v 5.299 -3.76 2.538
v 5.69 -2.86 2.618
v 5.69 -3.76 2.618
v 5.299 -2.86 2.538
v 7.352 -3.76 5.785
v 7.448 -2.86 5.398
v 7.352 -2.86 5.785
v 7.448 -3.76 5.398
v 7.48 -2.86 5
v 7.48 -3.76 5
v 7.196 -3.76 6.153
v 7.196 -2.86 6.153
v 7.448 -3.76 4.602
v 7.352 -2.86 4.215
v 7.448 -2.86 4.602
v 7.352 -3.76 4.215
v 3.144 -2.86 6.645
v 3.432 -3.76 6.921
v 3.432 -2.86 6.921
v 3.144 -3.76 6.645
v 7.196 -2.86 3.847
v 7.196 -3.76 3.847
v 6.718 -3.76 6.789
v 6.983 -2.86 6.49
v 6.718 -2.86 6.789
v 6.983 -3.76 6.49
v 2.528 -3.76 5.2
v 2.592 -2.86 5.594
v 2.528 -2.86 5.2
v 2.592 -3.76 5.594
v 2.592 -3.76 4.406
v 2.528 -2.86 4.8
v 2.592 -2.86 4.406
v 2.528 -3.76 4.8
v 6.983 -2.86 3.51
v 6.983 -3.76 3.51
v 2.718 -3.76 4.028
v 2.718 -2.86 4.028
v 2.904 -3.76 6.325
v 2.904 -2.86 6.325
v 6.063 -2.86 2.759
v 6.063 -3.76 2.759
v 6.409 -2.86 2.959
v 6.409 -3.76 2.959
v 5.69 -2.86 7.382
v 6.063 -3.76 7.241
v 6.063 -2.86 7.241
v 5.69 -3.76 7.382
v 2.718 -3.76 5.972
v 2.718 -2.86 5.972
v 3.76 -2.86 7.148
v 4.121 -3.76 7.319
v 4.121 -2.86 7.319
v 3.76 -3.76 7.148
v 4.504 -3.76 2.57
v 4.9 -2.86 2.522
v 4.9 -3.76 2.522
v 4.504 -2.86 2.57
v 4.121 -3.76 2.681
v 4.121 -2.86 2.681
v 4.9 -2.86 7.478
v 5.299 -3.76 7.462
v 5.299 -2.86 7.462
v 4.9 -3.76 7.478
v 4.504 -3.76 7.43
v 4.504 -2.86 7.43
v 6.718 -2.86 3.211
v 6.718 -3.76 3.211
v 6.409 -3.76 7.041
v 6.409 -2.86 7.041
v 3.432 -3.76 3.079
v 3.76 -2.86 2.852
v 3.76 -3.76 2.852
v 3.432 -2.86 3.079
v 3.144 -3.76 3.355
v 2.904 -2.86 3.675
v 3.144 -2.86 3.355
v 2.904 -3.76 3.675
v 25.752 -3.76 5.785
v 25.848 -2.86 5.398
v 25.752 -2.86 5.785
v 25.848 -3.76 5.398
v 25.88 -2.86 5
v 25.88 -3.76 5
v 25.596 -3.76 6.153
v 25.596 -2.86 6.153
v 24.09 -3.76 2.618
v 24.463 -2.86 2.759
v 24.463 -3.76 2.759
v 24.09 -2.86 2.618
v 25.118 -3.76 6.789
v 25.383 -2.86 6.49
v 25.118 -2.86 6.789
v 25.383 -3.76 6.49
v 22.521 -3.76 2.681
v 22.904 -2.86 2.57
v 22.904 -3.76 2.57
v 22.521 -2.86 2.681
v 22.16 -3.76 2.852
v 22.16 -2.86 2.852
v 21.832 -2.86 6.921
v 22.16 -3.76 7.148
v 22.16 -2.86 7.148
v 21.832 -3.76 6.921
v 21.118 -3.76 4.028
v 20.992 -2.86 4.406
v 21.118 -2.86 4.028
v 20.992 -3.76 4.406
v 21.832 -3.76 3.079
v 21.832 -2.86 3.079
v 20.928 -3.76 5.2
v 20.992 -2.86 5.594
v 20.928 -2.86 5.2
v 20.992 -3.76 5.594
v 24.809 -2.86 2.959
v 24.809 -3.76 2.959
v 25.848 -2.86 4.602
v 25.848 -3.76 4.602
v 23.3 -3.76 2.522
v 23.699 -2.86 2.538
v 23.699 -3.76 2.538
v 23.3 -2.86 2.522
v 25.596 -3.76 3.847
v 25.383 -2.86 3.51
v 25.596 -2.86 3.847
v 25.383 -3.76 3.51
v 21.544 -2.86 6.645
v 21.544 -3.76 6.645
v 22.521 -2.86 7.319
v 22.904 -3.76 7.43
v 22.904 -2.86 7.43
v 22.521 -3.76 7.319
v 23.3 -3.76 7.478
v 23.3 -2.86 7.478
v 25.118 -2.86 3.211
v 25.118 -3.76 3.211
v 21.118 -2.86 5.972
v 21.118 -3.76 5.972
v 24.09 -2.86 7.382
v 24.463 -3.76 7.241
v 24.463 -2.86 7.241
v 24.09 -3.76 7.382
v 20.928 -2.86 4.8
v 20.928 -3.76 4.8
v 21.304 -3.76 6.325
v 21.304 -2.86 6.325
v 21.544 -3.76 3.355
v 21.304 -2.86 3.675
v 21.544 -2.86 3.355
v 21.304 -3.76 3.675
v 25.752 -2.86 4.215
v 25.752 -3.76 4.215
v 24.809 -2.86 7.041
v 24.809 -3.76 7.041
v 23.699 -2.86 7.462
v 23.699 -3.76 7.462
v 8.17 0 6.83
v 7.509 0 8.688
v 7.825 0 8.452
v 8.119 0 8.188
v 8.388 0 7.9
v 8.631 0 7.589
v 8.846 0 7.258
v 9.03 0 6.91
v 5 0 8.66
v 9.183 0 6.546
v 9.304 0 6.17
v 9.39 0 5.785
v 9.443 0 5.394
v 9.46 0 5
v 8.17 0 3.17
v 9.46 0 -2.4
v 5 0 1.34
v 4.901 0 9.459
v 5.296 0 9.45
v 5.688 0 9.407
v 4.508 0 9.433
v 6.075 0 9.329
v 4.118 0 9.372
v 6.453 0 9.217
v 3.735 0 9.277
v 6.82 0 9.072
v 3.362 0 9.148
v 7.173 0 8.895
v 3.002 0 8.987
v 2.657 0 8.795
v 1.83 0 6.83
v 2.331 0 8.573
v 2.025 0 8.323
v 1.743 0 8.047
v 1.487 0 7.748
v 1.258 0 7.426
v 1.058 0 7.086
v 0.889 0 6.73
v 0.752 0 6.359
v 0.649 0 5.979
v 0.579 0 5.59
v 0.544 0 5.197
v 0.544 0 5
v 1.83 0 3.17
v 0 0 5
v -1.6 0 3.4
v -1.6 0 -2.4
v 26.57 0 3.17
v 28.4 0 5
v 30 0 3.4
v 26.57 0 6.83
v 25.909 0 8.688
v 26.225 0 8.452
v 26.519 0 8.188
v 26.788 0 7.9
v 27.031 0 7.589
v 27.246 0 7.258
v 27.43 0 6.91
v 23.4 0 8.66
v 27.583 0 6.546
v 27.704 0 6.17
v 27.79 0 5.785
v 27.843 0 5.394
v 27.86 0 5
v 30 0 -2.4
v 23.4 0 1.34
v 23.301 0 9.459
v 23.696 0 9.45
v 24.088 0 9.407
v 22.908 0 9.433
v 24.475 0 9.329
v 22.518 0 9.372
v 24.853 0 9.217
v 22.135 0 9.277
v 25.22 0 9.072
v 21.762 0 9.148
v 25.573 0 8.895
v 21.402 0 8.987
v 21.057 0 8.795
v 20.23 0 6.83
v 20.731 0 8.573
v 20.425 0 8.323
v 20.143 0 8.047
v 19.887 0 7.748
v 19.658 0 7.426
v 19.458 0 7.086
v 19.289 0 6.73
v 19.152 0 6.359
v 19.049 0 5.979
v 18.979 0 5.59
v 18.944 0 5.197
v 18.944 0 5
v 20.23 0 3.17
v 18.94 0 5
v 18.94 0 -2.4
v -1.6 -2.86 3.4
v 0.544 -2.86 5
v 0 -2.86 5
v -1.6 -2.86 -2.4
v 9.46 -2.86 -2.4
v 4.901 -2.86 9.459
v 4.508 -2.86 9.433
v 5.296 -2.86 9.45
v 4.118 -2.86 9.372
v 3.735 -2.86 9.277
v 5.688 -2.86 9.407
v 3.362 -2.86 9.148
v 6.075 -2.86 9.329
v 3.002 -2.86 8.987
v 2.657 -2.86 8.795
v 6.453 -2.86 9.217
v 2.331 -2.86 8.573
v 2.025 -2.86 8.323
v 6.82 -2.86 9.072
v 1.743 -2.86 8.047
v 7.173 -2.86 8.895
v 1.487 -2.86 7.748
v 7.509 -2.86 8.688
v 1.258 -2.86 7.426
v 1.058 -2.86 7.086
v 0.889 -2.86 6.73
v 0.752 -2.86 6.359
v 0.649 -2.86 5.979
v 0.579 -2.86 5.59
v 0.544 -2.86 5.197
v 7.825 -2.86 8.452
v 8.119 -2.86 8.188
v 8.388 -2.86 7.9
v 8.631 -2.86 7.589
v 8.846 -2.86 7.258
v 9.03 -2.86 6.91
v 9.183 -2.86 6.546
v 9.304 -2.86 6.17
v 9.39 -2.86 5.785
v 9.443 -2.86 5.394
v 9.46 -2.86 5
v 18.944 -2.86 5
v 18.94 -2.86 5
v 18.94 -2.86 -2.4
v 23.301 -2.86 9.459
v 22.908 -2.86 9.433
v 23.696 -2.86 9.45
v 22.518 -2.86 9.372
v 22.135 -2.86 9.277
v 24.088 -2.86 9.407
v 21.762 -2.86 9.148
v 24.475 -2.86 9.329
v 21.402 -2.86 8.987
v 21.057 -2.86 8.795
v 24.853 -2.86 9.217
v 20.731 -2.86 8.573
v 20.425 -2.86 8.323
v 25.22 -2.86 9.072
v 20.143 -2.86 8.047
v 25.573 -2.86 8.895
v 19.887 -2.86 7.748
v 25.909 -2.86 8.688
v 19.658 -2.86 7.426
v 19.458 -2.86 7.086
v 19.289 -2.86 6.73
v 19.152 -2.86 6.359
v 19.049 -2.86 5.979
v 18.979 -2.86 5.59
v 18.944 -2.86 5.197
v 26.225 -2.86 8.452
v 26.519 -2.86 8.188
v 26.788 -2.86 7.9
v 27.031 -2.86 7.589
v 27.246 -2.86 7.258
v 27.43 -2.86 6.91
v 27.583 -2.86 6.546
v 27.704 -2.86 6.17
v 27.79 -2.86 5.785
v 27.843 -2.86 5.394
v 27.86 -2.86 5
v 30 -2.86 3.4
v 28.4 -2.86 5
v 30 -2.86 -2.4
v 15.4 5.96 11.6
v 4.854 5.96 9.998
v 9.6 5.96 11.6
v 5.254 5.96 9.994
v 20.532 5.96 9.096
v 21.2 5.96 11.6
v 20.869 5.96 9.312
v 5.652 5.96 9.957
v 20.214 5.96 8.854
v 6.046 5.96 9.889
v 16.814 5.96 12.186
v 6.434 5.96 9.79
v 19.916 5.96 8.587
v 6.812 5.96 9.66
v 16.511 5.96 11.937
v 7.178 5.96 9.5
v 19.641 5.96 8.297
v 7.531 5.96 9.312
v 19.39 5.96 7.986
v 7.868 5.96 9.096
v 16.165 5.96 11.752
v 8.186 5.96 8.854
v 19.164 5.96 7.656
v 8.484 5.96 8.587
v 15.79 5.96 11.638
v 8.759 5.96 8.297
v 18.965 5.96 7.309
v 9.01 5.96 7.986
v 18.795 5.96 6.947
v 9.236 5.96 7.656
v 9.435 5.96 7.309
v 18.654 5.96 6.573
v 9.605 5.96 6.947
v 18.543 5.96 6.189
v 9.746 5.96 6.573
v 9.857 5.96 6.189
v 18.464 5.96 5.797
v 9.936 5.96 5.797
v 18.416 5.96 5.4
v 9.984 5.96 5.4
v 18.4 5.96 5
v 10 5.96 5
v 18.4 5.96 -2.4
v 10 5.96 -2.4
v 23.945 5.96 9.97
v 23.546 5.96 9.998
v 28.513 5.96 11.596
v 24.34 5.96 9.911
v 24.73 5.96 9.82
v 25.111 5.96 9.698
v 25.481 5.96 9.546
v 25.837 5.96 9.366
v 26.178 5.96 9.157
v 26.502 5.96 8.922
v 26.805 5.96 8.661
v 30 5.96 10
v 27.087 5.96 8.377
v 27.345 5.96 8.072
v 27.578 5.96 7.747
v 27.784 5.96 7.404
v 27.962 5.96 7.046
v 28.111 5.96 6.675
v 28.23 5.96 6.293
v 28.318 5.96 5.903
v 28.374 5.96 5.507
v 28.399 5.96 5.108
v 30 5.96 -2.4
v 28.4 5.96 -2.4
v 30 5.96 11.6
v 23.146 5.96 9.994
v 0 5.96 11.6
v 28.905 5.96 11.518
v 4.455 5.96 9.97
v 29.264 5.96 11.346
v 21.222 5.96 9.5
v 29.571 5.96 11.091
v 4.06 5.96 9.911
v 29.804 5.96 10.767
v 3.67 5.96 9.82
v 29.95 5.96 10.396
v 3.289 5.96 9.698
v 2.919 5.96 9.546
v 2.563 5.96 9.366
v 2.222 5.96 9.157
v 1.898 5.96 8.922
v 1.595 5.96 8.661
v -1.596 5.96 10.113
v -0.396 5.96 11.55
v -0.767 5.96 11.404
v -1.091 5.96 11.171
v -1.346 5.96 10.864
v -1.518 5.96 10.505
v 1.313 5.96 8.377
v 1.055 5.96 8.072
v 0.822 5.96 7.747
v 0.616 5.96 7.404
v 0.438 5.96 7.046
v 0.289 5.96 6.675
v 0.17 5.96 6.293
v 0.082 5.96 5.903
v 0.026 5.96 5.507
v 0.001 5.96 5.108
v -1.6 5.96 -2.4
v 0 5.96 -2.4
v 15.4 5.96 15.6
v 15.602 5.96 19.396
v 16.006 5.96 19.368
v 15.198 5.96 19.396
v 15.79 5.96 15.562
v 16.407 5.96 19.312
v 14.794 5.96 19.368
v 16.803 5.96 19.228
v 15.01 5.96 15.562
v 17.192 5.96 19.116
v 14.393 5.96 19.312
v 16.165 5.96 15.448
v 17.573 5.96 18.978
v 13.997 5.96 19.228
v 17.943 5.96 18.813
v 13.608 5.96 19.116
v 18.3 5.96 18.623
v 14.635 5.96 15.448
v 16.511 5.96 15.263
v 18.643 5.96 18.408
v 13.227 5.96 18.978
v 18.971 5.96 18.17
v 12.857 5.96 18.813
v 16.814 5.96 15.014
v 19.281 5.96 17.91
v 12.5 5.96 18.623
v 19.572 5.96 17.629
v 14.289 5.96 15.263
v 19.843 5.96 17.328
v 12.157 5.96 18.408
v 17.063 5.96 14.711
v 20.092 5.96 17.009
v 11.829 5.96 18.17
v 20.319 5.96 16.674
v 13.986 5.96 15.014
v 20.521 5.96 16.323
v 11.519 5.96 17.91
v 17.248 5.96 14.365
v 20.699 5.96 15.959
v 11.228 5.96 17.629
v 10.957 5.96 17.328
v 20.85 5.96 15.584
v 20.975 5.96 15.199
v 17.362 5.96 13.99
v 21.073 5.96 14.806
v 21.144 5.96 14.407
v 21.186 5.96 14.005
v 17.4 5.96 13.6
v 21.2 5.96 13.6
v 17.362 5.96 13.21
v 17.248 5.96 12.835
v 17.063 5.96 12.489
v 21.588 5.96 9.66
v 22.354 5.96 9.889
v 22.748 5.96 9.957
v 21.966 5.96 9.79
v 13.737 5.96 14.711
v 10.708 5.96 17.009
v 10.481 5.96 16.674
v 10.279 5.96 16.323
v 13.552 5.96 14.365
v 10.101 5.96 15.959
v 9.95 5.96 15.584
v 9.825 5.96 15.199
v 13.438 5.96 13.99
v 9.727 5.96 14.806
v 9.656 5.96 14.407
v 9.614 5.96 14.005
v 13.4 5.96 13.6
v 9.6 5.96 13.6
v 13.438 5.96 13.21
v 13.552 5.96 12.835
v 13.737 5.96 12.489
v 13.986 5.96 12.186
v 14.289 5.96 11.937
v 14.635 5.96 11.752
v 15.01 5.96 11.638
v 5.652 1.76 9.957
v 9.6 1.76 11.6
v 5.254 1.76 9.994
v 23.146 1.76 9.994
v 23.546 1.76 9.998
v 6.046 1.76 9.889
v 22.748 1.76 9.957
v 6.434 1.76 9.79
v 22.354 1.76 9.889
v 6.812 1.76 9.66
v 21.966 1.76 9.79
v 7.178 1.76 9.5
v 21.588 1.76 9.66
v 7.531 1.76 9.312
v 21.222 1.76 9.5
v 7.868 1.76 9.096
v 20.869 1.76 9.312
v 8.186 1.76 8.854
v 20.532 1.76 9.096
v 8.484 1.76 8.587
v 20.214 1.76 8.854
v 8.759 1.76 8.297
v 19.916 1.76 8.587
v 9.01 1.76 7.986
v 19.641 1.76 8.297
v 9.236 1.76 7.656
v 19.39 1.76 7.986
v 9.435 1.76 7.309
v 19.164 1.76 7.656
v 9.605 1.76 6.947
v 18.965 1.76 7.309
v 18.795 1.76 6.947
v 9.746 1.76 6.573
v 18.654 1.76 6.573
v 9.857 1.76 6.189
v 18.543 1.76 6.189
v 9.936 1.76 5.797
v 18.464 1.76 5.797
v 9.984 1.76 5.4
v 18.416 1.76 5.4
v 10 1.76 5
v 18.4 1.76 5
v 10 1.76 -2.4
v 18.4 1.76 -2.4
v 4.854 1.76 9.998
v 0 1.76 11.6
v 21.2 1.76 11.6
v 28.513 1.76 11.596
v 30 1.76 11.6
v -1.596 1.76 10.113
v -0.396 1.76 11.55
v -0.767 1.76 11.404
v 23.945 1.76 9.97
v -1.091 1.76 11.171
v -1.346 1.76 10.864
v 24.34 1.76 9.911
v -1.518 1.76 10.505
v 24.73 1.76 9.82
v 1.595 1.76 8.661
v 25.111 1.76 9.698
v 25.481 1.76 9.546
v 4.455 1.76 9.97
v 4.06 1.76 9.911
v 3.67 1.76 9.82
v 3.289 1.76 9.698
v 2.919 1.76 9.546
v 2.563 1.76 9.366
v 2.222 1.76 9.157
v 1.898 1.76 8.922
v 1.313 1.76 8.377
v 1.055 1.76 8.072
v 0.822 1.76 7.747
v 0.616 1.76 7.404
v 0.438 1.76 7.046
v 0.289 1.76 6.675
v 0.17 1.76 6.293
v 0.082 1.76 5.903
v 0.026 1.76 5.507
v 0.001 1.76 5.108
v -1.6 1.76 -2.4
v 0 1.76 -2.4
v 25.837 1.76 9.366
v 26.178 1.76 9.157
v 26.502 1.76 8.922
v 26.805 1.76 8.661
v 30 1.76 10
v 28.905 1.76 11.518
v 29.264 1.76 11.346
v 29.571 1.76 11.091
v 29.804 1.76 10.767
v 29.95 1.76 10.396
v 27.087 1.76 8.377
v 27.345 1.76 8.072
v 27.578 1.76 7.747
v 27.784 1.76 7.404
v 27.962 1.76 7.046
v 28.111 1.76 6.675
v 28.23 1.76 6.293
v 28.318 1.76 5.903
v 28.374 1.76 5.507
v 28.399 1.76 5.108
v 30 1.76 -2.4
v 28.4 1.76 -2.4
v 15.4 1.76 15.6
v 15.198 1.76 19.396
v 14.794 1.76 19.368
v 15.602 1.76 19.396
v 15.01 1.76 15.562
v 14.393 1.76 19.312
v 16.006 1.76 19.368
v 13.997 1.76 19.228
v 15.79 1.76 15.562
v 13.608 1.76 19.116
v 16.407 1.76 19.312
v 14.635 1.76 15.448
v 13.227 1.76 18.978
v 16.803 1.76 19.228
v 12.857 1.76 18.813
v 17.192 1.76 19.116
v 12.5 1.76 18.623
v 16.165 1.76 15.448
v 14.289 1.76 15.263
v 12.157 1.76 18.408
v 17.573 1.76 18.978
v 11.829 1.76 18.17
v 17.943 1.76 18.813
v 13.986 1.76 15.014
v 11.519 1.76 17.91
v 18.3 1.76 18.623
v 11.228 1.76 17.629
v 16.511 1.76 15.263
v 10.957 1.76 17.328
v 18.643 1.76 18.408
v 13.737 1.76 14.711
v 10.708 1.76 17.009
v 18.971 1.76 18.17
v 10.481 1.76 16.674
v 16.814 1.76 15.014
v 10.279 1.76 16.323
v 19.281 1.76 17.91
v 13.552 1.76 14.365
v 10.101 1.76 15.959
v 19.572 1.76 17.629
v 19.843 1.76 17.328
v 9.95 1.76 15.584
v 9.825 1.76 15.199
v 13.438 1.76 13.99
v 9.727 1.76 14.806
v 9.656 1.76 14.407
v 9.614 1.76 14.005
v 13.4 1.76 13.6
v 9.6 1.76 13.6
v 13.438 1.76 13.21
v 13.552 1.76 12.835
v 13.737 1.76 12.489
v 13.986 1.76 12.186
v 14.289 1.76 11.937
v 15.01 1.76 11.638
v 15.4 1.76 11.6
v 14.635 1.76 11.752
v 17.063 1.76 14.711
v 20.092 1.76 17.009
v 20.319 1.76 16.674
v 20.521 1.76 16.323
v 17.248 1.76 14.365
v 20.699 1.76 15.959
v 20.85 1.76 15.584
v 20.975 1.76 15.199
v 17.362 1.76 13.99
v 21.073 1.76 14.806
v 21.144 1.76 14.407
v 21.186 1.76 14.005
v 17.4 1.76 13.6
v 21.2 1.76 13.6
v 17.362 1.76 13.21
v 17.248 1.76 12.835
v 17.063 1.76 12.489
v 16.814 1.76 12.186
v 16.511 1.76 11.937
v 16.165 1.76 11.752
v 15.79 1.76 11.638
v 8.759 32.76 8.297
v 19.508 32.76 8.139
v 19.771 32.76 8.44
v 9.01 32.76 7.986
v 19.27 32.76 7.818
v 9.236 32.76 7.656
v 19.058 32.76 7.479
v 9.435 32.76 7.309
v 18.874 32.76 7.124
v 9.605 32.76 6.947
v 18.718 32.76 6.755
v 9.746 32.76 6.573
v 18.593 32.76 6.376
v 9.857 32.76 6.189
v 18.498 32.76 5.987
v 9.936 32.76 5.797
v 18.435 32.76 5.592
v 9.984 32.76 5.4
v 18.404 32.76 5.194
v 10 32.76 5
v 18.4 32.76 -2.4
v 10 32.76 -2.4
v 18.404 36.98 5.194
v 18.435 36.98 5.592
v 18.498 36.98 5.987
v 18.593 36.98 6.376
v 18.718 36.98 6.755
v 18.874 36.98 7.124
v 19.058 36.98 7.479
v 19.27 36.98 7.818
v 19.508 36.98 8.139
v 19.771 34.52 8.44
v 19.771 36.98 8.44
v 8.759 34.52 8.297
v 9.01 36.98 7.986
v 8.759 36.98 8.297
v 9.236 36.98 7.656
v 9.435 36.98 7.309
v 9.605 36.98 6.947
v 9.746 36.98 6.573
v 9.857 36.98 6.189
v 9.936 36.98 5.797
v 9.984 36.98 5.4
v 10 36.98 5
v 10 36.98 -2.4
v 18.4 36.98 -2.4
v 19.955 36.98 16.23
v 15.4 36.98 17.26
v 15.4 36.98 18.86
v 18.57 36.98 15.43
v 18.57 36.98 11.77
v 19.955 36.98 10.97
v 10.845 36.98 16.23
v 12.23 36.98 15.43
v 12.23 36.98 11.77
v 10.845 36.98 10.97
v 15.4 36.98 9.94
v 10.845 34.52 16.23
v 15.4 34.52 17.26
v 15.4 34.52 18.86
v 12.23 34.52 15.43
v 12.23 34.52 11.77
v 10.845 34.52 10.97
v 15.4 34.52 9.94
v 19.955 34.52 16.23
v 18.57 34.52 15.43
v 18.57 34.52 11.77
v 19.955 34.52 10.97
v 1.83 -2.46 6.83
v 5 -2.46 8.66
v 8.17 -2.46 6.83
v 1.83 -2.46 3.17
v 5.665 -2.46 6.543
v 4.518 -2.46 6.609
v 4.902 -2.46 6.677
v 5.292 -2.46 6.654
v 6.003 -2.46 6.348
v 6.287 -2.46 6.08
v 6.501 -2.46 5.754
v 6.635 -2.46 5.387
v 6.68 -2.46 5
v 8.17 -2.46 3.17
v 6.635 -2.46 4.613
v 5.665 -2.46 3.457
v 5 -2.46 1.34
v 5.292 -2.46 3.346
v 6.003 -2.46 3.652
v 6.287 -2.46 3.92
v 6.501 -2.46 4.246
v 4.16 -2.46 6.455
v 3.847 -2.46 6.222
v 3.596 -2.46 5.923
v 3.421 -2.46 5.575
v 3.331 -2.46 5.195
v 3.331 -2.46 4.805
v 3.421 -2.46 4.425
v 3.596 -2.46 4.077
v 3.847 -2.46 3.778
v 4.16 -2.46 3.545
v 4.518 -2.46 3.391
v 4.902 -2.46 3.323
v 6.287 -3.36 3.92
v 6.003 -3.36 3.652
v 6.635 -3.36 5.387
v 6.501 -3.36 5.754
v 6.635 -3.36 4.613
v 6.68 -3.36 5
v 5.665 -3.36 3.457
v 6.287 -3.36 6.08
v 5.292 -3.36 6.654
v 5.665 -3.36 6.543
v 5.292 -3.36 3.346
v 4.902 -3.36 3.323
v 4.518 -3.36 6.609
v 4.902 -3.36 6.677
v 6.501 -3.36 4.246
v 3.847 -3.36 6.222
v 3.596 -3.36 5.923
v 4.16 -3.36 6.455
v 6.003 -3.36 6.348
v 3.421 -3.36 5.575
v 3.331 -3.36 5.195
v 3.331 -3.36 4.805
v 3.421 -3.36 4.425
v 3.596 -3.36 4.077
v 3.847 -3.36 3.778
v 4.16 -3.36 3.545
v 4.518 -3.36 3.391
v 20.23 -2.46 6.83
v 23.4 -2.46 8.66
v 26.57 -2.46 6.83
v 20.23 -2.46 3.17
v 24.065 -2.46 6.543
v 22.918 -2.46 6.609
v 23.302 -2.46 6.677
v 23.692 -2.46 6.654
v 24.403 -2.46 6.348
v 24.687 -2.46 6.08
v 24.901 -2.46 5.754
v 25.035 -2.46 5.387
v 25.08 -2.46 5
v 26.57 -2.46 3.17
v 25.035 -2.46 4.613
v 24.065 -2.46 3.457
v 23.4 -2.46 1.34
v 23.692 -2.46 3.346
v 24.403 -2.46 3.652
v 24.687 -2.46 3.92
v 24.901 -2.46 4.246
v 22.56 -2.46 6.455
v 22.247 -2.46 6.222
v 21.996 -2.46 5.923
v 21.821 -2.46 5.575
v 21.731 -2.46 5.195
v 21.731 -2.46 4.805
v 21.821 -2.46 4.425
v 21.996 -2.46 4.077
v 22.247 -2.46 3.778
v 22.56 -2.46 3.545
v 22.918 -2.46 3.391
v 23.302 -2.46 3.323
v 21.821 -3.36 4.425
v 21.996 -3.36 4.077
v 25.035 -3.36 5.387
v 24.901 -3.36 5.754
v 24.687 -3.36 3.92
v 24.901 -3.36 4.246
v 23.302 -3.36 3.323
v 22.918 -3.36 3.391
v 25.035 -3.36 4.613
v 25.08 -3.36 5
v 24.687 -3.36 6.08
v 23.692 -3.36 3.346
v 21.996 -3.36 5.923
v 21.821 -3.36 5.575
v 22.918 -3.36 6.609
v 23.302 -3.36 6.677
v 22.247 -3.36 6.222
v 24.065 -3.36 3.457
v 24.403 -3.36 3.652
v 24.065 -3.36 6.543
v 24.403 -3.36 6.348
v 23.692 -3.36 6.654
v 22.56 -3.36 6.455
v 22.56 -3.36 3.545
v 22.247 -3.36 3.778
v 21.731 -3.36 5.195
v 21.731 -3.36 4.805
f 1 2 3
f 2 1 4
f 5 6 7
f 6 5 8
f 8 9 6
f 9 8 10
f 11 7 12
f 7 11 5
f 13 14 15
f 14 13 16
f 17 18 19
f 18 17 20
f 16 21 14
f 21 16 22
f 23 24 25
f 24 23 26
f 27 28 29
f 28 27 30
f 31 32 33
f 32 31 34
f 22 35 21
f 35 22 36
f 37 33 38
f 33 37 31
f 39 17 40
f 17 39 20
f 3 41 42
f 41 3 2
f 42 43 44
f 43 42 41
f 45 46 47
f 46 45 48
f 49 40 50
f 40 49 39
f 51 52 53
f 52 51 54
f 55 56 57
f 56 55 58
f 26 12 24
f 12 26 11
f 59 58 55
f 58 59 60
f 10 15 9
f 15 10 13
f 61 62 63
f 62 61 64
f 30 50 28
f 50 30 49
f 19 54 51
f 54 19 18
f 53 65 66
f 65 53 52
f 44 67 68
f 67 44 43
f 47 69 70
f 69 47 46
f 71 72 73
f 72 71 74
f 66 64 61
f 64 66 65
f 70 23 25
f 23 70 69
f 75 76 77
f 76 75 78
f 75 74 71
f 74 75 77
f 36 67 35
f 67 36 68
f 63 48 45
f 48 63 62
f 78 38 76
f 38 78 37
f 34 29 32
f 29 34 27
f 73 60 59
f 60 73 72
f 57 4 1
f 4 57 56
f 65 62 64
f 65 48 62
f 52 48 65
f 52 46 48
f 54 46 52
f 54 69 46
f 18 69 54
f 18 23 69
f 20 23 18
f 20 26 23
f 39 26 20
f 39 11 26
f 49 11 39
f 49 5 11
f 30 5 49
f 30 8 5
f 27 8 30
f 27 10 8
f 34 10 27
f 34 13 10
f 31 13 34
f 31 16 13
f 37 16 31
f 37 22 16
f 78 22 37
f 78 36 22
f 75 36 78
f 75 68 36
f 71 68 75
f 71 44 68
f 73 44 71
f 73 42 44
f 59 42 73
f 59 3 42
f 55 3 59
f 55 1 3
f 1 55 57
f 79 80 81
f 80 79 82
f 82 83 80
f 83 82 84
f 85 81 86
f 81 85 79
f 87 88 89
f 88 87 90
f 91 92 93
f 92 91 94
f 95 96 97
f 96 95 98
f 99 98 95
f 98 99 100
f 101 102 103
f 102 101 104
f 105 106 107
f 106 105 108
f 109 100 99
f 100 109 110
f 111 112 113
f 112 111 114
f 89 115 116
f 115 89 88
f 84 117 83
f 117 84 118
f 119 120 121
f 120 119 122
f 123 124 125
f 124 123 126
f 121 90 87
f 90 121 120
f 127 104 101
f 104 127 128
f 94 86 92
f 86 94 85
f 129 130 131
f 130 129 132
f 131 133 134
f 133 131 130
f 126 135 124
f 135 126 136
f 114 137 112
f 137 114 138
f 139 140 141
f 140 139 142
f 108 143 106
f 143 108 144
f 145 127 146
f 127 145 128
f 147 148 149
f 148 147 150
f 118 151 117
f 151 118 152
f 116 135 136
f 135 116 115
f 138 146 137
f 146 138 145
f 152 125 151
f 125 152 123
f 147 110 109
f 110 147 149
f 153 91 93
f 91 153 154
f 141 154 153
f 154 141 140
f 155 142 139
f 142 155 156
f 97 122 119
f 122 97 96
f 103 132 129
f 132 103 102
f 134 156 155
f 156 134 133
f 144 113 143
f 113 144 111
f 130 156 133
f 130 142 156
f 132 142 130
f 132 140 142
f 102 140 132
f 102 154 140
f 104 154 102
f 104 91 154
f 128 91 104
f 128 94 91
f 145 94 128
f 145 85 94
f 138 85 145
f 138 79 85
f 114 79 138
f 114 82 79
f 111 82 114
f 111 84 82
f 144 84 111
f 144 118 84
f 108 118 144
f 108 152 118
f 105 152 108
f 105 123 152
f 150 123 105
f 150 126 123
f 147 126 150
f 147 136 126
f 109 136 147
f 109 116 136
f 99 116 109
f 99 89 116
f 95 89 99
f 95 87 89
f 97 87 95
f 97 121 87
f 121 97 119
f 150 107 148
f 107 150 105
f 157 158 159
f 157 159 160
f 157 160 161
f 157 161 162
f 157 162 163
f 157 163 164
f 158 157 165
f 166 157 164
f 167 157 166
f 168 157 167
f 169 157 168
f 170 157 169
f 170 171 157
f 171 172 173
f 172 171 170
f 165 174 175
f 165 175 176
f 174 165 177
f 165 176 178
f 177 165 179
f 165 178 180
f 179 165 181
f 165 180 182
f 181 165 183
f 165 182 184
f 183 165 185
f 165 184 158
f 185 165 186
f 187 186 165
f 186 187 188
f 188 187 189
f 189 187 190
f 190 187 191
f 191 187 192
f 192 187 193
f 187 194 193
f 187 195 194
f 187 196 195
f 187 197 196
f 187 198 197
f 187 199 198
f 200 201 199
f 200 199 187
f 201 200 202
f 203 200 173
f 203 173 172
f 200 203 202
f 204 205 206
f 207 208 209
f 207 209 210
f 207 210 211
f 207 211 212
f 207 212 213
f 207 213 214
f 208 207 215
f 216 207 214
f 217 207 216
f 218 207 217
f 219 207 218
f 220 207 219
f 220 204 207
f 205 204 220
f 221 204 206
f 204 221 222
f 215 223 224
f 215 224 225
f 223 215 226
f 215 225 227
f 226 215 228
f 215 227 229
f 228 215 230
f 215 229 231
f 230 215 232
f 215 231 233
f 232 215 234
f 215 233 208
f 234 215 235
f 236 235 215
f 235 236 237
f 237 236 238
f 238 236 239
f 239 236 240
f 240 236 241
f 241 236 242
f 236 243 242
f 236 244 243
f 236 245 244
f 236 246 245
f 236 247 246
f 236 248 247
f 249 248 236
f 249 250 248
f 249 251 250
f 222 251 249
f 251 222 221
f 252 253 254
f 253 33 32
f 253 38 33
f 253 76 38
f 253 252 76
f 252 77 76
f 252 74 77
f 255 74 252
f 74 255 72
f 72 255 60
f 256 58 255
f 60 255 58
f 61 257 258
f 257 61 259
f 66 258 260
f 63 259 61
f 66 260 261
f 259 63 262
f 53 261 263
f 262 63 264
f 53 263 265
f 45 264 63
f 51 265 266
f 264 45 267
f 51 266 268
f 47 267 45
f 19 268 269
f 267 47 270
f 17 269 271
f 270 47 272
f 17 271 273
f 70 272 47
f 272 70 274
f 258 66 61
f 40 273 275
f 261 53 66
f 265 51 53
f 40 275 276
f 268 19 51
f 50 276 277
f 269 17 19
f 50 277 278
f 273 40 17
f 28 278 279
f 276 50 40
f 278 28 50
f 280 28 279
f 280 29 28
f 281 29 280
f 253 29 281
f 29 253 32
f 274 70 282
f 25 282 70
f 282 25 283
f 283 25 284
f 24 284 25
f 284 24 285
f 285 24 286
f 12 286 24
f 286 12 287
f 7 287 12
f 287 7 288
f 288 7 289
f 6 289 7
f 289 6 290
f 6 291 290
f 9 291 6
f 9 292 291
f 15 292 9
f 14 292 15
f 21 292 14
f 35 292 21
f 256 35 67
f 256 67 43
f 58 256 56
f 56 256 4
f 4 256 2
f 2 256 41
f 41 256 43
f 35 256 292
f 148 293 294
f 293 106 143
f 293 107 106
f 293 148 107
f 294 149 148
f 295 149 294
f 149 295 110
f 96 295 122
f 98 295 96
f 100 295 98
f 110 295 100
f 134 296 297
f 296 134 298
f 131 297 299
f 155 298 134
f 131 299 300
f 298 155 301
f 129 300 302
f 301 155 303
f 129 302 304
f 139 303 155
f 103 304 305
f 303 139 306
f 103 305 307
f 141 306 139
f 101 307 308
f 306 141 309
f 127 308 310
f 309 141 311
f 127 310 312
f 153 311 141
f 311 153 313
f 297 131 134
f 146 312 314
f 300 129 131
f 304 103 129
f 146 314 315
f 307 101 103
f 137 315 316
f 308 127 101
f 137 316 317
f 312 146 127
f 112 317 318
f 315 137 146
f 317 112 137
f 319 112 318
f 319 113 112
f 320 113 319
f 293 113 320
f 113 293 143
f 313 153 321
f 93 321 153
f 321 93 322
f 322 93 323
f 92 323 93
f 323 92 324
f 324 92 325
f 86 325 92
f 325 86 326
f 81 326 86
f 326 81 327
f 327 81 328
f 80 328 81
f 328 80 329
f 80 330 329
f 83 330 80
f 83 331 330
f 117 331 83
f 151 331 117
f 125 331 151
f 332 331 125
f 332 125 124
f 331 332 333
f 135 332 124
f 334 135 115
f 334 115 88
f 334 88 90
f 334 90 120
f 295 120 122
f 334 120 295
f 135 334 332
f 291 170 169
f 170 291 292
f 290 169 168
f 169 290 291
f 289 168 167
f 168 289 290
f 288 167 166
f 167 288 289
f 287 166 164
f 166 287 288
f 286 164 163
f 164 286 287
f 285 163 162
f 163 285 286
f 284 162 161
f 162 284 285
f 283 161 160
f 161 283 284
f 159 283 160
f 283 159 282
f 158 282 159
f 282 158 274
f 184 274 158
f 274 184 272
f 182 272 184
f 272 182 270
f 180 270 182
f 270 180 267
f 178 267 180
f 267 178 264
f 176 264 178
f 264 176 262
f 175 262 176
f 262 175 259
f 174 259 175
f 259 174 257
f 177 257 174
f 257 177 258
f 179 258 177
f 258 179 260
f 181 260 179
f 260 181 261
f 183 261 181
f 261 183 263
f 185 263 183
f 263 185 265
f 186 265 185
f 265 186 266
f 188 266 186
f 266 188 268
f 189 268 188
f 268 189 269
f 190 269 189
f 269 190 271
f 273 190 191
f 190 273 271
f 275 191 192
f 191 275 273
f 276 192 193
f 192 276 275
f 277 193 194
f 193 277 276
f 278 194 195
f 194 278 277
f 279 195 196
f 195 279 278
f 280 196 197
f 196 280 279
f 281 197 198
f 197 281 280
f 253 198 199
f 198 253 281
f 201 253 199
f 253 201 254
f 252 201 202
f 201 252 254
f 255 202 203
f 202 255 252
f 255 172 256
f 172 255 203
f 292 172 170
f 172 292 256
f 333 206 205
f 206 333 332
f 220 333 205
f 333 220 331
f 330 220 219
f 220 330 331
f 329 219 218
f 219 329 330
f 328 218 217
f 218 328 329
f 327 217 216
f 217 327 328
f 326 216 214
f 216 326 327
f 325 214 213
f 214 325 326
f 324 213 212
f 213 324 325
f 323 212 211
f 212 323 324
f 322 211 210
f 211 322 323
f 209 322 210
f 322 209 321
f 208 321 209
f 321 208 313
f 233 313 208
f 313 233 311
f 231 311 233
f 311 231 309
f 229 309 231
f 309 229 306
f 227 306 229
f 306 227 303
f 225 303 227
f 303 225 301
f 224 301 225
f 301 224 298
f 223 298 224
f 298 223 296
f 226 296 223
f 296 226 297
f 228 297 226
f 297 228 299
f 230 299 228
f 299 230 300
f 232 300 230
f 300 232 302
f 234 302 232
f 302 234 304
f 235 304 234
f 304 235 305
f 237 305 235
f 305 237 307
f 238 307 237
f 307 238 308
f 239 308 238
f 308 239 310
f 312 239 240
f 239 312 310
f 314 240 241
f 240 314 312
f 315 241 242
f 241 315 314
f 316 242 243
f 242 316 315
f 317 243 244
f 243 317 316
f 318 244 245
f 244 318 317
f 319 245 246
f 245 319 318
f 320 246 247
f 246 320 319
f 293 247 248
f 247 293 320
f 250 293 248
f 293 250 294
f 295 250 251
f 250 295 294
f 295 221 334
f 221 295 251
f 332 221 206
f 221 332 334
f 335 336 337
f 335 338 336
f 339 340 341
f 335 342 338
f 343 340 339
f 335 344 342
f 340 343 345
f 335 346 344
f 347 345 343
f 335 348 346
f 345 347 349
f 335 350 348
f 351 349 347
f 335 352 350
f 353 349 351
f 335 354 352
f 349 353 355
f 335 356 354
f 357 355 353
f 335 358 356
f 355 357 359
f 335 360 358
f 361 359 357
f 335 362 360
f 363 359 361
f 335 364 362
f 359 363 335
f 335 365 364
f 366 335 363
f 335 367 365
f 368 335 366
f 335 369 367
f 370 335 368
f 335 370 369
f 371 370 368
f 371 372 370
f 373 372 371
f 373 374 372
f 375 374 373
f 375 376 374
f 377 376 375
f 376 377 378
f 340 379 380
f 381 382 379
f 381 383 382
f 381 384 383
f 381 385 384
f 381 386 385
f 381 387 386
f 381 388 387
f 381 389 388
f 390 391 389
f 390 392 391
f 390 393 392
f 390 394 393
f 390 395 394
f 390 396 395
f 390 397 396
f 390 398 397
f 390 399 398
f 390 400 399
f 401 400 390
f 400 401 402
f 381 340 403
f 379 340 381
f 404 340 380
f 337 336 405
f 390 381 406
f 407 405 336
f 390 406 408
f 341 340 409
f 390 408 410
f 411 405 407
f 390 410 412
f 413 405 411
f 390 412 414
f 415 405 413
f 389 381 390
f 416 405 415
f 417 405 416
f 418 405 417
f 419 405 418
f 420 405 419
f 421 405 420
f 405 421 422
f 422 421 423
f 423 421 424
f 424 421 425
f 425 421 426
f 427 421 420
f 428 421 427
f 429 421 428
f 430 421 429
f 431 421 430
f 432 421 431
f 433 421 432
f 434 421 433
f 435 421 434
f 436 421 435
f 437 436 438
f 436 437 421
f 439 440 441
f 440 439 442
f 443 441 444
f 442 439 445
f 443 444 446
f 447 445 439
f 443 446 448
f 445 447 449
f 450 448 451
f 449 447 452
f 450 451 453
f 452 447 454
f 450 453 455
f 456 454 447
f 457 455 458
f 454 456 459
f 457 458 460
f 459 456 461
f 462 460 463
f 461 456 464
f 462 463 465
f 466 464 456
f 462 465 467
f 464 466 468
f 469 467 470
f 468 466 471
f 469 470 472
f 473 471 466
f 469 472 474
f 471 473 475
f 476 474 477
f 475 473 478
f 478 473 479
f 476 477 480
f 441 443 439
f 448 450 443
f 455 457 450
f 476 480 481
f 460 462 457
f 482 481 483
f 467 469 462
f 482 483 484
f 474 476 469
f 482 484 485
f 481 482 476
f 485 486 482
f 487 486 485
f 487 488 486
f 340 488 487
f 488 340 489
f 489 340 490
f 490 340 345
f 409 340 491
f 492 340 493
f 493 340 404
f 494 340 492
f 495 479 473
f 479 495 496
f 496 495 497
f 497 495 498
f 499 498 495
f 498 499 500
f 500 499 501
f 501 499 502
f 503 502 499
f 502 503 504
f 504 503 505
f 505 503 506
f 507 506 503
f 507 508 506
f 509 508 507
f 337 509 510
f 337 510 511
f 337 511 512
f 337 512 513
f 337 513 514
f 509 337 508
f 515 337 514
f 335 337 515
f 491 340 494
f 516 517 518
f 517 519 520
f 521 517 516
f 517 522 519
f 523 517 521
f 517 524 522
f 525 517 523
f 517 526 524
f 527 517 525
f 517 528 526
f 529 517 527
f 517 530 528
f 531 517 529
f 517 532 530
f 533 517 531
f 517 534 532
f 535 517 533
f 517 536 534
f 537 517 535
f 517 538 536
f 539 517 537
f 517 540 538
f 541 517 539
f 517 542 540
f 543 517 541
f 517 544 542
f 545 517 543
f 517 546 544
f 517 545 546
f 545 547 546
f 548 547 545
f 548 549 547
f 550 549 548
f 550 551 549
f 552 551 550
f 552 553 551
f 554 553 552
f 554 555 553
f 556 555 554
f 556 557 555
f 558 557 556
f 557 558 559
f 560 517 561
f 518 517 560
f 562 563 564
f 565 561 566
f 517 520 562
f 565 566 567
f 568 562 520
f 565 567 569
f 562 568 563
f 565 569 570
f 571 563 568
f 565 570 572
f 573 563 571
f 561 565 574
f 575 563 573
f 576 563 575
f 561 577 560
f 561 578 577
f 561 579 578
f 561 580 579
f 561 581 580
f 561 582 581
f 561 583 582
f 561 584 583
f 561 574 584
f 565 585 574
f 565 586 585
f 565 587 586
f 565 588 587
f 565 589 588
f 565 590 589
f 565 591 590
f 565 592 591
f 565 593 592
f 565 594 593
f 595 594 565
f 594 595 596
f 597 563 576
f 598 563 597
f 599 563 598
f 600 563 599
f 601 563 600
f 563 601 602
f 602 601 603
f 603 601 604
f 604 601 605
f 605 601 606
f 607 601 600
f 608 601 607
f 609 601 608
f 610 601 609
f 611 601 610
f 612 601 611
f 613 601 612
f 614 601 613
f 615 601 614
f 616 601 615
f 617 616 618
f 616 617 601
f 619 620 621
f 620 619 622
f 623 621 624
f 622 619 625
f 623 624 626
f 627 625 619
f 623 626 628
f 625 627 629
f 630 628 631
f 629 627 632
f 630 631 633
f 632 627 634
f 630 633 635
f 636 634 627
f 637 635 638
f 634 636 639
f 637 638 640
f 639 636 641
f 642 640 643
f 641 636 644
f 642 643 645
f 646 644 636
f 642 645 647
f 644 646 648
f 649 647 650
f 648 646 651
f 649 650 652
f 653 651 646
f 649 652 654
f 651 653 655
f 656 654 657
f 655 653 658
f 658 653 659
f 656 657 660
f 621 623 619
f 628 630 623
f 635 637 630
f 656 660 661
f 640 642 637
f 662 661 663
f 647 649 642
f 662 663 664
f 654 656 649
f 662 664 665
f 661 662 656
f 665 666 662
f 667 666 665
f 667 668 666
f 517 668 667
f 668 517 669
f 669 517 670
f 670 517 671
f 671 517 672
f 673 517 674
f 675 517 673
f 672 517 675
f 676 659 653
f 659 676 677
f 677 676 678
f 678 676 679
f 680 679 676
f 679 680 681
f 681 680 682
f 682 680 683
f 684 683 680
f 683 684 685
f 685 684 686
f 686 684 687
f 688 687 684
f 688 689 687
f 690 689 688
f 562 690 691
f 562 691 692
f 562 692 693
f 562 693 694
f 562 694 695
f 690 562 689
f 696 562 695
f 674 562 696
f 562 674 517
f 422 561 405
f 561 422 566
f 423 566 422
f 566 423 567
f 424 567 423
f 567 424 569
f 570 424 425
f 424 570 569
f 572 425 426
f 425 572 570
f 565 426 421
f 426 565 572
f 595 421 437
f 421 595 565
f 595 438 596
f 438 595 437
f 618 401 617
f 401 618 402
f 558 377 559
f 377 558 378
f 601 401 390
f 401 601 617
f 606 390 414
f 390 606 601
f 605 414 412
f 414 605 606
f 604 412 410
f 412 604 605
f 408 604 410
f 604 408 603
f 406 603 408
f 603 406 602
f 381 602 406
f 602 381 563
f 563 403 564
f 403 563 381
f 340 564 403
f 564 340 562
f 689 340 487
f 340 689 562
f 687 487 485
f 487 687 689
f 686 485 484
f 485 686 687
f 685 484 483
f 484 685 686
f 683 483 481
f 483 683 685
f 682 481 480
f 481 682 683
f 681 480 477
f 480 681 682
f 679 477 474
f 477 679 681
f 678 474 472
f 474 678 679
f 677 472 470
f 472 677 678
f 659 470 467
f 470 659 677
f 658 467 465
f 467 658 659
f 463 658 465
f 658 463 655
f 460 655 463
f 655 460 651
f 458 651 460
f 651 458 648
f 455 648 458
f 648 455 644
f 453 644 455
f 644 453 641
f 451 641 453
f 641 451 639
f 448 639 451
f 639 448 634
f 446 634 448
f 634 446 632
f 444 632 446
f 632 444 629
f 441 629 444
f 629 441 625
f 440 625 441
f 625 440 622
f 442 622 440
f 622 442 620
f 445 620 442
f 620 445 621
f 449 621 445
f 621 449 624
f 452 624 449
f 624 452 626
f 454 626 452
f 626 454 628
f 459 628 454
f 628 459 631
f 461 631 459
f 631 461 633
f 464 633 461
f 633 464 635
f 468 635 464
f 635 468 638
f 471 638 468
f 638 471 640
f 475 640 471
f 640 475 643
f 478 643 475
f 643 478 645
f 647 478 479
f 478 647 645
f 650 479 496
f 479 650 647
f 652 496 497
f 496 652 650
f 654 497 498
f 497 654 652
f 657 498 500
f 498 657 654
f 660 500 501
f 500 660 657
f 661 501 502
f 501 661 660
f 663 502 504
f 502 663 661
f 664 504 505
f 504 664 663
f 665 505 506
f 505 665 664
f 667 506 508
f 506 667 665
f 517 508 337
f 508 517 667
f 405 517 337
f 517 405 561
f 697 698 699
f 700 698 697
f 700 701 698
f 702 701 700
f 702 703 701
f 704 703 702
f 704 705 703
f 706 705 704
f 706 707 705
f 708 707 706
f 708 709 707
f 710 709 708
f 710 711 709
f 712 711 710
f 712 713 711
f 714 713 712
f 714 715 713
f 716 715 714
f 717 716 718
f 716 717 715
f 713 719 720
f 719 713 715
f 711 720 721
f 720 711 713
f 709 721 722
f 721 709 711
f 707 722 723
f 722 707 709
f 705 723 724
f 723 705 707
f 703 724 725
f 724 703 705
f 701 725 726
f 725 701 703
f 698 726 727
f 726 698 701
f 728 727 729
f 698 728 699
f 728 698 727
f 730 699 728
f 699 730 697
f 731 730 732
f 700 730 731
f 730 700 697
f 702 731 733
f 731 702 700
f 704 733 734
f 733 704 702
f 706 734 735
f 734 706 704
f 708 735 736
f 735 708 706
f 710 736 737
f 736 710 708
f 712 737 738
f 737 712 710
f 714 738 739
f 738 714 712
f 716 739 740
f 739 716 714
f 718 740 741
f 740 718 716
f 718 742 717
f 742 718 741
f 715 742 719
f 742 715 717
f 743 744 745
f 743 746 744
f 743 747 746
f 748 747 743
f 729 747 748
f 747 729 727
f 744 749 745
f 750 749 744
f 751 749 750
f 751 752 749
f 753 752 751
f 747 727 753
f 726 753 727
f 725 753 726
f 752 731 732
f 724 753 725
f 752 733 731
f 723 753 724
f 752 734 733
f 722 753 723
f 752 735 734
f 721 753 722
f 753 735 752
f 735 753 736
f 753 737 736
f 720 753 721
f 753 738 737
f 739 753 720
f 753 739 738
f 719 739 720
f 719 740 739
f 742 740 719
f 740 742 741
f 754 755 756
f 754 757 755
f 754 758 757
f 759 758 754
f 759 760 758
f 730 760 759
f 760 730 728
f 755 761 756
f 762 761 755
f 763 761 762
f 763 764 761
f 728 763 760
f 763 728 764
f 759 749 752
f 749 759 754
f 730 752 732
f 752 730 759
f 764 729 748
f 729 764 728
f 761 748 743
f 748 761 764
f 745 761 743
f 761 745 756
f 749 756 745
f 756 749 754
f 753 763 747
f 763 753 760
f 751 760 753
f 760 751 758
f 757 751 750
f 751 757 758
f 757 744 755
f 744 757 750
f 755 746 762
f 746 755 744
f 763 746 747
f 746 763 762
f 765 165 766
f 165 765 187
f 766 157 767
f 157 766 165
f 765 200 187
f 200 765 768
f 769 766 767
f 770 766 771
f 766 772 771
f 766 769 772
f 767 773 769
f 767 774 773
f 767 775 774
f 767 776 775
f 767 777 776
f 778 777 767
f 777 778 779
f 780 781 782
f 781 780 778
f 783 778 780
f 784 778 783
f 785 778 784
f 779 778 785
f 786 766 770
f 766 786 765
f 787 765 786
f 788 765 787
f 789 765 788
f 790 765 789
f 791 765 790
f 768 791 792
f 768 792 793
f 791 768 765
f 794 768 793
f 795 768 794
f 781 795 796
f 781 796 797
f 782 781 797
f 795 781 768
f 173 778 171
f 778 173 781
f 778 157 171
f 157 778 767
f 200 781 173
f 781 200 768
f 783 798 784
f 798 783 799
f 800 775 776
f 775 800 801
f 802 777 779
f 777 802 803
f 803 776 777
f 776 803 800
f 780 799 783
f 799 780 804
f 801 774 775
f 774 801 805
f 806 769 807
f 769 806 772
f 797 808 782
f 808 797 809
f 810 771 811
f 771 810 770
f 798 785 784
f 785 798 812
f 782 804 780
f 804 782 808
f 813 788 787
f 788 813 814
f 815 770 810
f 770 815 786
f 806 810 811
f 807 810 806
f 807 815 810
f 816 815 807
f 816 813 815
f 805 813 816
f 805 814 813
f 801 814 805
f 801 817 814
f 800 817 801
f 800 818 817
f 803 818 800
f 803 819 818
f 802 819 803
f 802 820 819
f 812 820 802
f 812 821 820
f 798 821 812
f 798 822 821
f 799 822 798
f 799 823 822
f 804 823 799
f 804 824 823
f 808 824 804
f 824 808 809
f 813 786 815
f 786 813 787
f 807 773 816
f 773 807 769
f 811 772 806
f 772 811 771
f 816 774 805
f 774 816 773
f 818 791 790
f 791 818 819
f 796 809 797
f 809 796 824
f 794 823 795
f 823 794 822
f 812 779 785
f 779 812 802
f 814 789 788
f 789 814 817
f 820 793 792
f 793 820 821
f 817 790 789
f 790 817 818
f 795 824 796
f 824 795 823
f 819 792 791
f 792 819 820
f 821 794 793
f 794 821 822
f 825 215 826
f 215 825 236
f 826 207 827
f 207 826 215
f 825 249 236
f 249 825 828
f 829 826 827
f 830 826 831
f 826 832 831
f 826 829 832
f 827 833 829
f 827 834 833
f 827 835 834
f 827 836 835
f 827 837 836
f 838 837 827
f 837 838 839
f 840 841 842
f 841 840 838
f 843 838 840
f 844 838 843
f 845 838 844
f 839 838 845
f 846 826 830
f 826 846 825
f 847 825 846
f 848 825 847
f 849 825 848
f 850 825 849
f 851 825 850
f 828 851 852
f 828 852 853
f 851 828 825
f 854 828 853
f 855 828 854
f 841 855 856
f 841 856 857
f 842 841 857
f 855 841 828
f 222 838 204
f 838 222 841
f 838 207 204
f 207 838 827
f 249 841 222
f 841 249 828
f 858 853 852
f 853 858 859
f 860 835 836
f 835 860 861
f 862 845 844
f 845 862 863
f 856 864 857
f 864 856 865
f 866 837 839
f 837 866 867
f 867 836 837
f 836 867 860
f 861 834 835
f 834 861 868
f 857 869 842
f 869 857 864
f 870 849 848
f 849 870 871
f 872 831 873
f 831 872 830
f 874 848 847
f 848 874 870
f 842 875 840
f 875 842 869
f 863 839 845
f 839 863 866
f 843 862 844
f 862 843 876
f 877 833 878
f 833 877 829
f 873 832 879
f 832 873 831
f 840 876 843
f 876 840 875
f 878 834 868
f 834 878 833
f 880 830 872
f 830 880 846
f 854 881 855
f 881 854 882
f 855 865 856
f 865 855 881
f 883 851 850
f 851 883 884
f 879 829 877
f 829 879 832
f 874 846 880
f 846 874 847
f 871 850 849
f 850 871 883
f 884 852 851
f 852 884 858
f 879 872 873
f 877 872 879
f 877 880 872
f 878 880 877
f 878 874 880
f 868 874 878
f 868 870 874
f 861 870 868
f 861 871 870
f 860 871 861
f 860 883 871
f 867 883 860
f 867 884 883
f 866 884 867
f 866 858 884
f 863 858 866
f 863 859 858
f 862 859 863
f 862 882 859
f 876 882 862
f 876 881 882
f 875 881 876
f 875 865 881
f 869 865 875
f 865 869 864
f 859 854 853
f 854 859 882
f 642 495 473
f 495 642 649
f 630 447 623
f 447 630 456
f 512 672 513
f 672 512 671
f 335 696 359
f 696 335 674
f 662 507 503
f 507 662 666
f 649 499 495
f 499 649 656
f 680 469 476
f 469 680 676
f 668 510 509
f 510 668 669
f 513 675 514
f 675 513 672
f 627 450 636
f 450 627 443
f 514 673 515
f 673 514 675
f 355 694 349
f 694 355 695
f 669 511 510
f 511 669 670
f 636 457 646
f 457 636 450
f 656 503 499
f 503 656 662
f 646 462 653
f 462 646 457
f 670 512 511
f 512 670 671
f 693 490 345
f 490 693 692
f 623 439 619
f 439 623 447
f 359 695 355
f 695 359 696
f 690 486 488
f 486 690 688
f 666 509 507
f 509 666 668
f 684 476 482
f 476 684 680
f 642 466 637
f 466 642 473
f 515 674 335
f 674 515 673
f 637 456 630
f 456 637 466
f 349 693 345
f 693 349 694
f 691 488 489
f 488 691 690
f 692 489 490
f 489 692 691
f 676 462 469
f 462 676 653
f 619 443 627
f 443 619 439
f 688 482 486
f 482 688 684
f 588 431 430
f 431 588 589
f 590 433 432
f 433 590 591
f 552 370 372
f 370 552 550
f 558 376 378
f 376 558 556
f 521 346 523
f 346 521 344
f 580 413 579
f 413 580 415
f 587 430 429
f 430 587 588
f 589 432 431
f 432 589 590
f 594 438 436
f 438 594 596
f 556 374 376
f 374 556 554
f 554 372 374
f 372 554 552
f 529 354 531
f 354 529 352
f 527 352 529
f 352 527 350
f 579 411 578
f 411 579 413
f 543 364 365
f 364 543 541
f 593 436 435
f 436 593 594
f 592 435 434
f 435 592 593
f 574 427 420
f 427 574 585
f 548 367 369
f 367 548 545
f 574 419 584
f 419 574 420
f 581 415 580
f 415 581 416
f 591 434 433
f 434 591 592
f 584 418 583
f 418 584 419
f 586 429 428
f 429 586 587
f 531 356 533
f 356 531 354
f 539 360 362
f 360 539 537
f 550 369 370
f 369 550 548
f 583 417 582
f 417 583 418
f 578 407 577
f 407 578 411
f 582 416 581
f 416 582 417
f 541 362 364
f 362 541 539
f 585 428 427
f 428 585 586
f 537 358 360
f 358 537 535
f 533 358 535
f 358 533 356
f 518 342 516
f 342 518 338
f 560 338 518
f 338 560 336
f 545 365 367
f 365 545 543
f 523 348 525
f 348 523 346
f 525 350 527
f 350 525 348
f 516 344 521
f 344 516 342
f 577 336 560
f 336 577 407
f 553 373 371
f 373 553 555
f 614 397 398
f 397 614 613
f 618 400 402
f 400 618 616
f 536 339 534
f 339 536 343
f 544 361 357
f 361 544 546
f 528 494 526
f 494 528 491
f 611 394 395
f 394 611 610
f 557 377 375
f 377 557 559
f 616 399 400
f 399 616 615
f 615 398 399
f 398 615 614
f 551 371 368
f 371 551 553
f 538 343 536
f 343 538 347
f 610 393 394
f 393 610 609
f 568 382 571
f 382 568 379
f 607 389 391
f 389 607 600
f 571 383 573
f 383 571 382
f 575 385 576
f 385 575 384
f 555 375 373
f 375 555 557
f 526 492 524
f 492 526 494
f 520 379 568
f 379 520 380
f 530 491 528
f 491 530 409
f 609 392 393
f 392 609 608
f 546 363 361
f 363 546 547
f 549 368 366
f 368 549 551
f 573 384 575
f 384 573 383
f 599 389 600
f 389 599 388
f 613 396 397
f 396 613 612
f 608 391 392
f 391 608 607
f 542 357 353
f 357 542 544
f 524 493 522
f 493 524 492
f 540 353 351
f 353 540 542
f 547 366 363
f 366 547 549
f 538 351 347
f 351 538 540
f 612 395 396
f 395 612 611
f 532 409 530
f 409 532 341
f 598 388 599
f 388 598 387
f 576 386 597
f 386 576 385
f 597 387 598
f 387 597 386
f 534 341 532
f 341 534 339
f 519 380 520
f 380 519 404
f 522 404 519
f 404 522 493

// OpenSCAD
// Copyright (C) 2025 Arif K. Rafiq
// This program is free software: you can redistribute it and/or modify
// it under the terms of the GNU General Public License as published by
// the Free Software Foundation, either version 3 of the License, or
// (at your option) any later version.

// This program is distributed in the hope that it will be useful,
// but WITHOUT ANY WARRANTY; without even the implied warranty of
// MERCHANTABILITY or FITNESS FOR A PARTICULAR PURPOSE.  See the
// GNU General Public License for more details.

// You should have received a copy of the GNU General Public License
// along with this file.  If not, see <https://www.gnu.org/licenses/>,
// or write to: license@temperedoptimism.com


/* 
(b)readth       :(w)est (X-)   (c)enter (X0) (e)east (X+)
(h)eight        :(d)own (Z-)   (g)round(Z0)  (u)p (Z+)

Vectors (v)     :(x), (y), (z)
Thicknesses (t) : Thicknesses to resolve 3D printer limits or rendering issues.
Proportion (p)  : container for grouping (r)adius and (i)ntensity into a singl 2d vector acccessed using .x and .y respectively
*/
/* 17:08 */
// Fixed in example3.scad       // Set limits in customizer
/* [Thicknesses (x),(y),(z)] */
tFitGap = [0.16, 0.16, 0.16];   //[0.00:0.01:0.64] 
tWallMin = [0.40, 0.40, 0.16];  //[0.16:0.08:1.60] 
/* [Proportional (x):(Radius, (y):(i)ntensity] */
pHexSink = [3.5, 2.3];          //[0.10:0.02:20.00] 
pFastShaft064 = [1.36, 5.80]; //0.10:0.02:20.00]
pFastShaft095 = [1.36, 9.30]; //0.10:0.02:20.00]
pWashSink = [4.00, 1.00]; //0.10:0.02:20.00]
/* [2D vectors (x), (y)] */
vTerminalW = [5.0, 5.0];     //[0.00:0.10:100] 
vTerminalE = [23.4, 5.0];    //[0.00:0.10:100]
vThermal = [ 15.4, 13.6];    //[0.00:0.10:100.00]
/* [Scalars] */
yControllerThermal=5.0; //[5.0:0.1:8.4]
leadingEdge = 2.4; //[0.8:0.4:5.0]
flankEdge = 1.6; //[0.8:0.4:5.0]
trailingEdge = 1.6; //[0.8:0.4:3.6]
hBoardDriver = 28.4; //[20:0.1:100.0]
hBoard = 1.6; //0.8:04:3.2]
hBoardController = 1.6; //[0.8:04:3.2]
// Adding space
hSpacer = 4.2; //[2.8:0.4:14]
rCorner = 1.6; //0.1
rTerminal = 5.0; //0.1
rThermal = 5.0;  //0.1
/* [Special ] */
fa0 = 4.0;     //[1:1:60]  
fs0 = 0.4;     //[0.1:0.1:4.0]  
fx0 = 3;       //[1,2,3,4,5,6,7,8,9,10]
/* [Hidden] */ 
tEps=0.01; 

/* Calucualted at run time. */
pHexSurround = [pHexSink.x + (tWallMin.x * 2) + tFitGap.x, pHexSink.y + tWallMin.y + tFitGap.y];
pExtension = [pFastShaft064.x + ((tWallMin.x + tFitGap.x)* 2), pFastShaft064.y + tWallMin.y + tFitGap.y - pHexSurround.y -hBoard - pWashSink.y];
aControllerRest= asin((vThermal.y - yControllerThermal - tFitGap.z - vTerminalW.y)/rThermal);

//30.00-35.00 Circles, Also look at the customizer!!
// Rotate
rotate([90,0,0]){
  difference(){
    union() {
      // hex pocket surround
      linear_extrude(pHexSurround.y, convexity=fx0){ 
        polygon([[vTerminalW.x + pHexSurround.x, vTerminalW.y],
              [ vTerminalW.x + pHexSurround.x, -leadingEdge],
              [-flankEdge, -leadingEdge],
              [-flankEdge, vTerminalW.y - rCorner],
              [-flankEdge + rCorner, vTerminalW.y]]);
        polygon([[vTerminalE.x - pHexSurround.x, vTerminalE.y],
              [ vTerminalE.x - pHexSurround.x, -leadingEdge],
              [hBoardDriver + flankEdge, -leadingEdge],
              [hBoardDriver + flankEdge, vTerminalE.y - rCorner],
              [hBoardDriver + flankEdge - rCorner, vTerminalE.y]]);       
              
        for(v = [vTerminalW, vTerminalE]){
          translate(v)  circle(pHexSurround.x, $fa=fa0, $fs=fs0 );
        }
      }
      // shaft extension
      for(v= [vTerminalW, vTerminalE]){
          translate([v.x, v.y, pHexSurround.y - tEps]) cylinder(pExtension.y + tEps, r=pExtension.x, $fa=fa0, $fs=fs0);
      }
      // board spacer
      translate([0, 0, -hBoard - tFitGap.y - hSpacer]) linear_extrude(hSpacer, convexity=fx0){
          polygon([[-flankEdge, -leadingEdge],
          [hBoardDriver + flankEdge, -leadingEdge],
          for(a = [0:max(fa0,(fs0*360)/(2*PI*rCorner)):90]) [rCorner *cos(a), rCorner *sin(a)] + [hBoardDriver + flankEdge - rCorner, vTerminalE.y + rTerminal + trailingEdge - rCorner ],
          [hBoardDriver + flankEdge, vTerminalE.y + rTerminal + trailingEdge],
          [vThermal.x + rThermal +(tWallMin.x * 2), vTerminalE.y + rTerminal + trailingEdge],
          [vThermal.x + rThermal +(tWallMin.x * 2), vThermal.y],
          [vThermal.x - rThermal -(tWallMin.x * 2), vThermal.y],
          [vThermal.x - rThermal -(tWallMin.x * 2), vTerminalW.y + rTerminal + trailingEdge],
          [-flankEdge, vTerminalW.y + rTerminal + trailingEdge],
          for(a = [90:max(fa0,(fs0*360)/(2*PI*rCorner)):180]) [rCorner *cos(a), rCorner *sin(a)] + [-flankEdge + rCorner, vTerminalW.y + rTerminal + trailingEdge - rCorner ]]);
          translate(vThermal) circle(rThermal + (tWallMin.x * 2), $fa=fa0, $fs=fs0);
      }
    // controller rest
      
    #translate([0,0, -hBoardDriver - tFitGap.y - hSpacer - hBoardController - tFitGap.y - (tEps*2)]) linear_extrude(hBoardController + tFitGap.y +(tEps*2), convexity=fx0) {
       polygon([[vTerminalW.x + rTerminal, - leadingEdge],
       for(a = [0:max(fa0,(fs0*360)/(2*PI*rTerminal)):aControllerRest]) [rTerminal *cos(a), rTerminal *sin(a)] +vTerminalW,
       for(a = [180 -aControllerRest:max(fa0,(fs0*360)/(2*PI*rTerminal)):180]) 
    [rTerminal *cos(a), rTerminal *sin(a)] +vTerminalE,
       [vTerminalE.x - rTerminal, -leadingEdge]]);
     }
     // thermal hex pocket
translate([0, 0, -hBoardDriver -tFitGap.y -hSpacer -hBoardController -tFitGap.y -pHexSink.y -tFitGap.y]) linear_extrude(pHexSink.y +tFitGap.y, convexity=fx0) {
    polygon([for(a = [90:-60:-30]) [(pHexSink.x +tFitGap.x +(tWallMin.x *4)) *cos(a), (pHexSink.x +tFitGap.x +(tWallMin.x *4)) *sin(a)] +vThermal
        ,for(a = [180 -aControllerRest:max(fa0,(fs0*360)/(2*PI*rTerminal)):180]) [rTerminal *cos(a), rTerminal *sin(a)] +vTerminalE
        ,[vTerminalE.x -rTerminal, -leadingEdge]
        ,[vTerminalW.x +rTerminal, -leadingEdge]
        ,for(a = [0:max(fa0,(fs0*360)/(2*PI*rTerminal)):aControllerRest]) [rTerminal *cos(a), rTerminal *sin(a)] +vTerminalW
        ,for(a = [210:-60:90]) [(pHexSink.x +tFitGap.x +(tWallMin.x *4)) *cos(a), (pHexSink.x +tFitGap.x +(tWallMin.x *4)) *sin(a)] +vThermal
            ,for(a=[90:60:450]) [(pHexSink.x +tFitGap.x) *cos(a), (pHexSink.x +tFitGap.x) * sin(a) ] +vThermal
    ]);
        
} 
    }
      
    for(v = [vTerminalW, vTerminalE]){
        // hex pocket
        #translate([v.x, v.y, -tEps]) rotate([0,0,30]) cylinder(pHexSurround.y - tWallMin.y + tEps, r=pHexSurround.x - (tWallMin.x * 2), $fn=6);
        // fastner hole
        #translate([v.x, v.y, -hBoard -pWashSink.y]) cylinder(pFastShaft064.y + tFitGap.y, r=pFastShaft064.x + (tFitGap.x * 2), $fa=fa0, $fs=fs0);
     
    }
   #translate([vThermal.x, vThermal.y, -hBoard + pWashSink.y]) rotate([0,180,0]) 
        cylinder(pFastShaft095.y + tFitGap.y, r=pFastShaft095.x + (tFitGap.x * 4), $fa=fa0, $fs=fs0);

    // terminal guide
   #translate([vTerminalW.x, vTerminalW.y, -hBoard - tFitGap.y -hSpacer -tEps ]) linear_extrude(hSpacer + (tEps *2), convexity=fx0) {
        polygon([for(a = [0:max(fa0, (fs0*360)/(2*PI*rTerminal)):180]) [rTerminal * cos(a), rTerminal *sin(a)]
        ,[-rTerminal, -vTerminalW.y -leadingEdge -tEps]
        ,[rTerminal, -vTerminalW.y -leadingEdge -tEps]]);
   }
   /* Mirror */
   #translate([vTerminalE.x, vTerminalE.y, -hBoard - tFitGap.y -hSpacer -tEps ]) linear_extrude(hSpacer + (tEps *2), convexity=fx0) {
        mirror([1,0,0]) 
        polygon([for(a = [0:max(fa0, (fs0*360)/(2*PI*rTerminal)):180]) [rTerminal * cos(a), rTerminal *sin(a)]
        ,[-rTerminal, -vTerminalW.y -leadingEdge -tEps]
        ,[rTerminal, -vTerminalW.y -leadingEdge -tEps]]);
   }
  }
}
